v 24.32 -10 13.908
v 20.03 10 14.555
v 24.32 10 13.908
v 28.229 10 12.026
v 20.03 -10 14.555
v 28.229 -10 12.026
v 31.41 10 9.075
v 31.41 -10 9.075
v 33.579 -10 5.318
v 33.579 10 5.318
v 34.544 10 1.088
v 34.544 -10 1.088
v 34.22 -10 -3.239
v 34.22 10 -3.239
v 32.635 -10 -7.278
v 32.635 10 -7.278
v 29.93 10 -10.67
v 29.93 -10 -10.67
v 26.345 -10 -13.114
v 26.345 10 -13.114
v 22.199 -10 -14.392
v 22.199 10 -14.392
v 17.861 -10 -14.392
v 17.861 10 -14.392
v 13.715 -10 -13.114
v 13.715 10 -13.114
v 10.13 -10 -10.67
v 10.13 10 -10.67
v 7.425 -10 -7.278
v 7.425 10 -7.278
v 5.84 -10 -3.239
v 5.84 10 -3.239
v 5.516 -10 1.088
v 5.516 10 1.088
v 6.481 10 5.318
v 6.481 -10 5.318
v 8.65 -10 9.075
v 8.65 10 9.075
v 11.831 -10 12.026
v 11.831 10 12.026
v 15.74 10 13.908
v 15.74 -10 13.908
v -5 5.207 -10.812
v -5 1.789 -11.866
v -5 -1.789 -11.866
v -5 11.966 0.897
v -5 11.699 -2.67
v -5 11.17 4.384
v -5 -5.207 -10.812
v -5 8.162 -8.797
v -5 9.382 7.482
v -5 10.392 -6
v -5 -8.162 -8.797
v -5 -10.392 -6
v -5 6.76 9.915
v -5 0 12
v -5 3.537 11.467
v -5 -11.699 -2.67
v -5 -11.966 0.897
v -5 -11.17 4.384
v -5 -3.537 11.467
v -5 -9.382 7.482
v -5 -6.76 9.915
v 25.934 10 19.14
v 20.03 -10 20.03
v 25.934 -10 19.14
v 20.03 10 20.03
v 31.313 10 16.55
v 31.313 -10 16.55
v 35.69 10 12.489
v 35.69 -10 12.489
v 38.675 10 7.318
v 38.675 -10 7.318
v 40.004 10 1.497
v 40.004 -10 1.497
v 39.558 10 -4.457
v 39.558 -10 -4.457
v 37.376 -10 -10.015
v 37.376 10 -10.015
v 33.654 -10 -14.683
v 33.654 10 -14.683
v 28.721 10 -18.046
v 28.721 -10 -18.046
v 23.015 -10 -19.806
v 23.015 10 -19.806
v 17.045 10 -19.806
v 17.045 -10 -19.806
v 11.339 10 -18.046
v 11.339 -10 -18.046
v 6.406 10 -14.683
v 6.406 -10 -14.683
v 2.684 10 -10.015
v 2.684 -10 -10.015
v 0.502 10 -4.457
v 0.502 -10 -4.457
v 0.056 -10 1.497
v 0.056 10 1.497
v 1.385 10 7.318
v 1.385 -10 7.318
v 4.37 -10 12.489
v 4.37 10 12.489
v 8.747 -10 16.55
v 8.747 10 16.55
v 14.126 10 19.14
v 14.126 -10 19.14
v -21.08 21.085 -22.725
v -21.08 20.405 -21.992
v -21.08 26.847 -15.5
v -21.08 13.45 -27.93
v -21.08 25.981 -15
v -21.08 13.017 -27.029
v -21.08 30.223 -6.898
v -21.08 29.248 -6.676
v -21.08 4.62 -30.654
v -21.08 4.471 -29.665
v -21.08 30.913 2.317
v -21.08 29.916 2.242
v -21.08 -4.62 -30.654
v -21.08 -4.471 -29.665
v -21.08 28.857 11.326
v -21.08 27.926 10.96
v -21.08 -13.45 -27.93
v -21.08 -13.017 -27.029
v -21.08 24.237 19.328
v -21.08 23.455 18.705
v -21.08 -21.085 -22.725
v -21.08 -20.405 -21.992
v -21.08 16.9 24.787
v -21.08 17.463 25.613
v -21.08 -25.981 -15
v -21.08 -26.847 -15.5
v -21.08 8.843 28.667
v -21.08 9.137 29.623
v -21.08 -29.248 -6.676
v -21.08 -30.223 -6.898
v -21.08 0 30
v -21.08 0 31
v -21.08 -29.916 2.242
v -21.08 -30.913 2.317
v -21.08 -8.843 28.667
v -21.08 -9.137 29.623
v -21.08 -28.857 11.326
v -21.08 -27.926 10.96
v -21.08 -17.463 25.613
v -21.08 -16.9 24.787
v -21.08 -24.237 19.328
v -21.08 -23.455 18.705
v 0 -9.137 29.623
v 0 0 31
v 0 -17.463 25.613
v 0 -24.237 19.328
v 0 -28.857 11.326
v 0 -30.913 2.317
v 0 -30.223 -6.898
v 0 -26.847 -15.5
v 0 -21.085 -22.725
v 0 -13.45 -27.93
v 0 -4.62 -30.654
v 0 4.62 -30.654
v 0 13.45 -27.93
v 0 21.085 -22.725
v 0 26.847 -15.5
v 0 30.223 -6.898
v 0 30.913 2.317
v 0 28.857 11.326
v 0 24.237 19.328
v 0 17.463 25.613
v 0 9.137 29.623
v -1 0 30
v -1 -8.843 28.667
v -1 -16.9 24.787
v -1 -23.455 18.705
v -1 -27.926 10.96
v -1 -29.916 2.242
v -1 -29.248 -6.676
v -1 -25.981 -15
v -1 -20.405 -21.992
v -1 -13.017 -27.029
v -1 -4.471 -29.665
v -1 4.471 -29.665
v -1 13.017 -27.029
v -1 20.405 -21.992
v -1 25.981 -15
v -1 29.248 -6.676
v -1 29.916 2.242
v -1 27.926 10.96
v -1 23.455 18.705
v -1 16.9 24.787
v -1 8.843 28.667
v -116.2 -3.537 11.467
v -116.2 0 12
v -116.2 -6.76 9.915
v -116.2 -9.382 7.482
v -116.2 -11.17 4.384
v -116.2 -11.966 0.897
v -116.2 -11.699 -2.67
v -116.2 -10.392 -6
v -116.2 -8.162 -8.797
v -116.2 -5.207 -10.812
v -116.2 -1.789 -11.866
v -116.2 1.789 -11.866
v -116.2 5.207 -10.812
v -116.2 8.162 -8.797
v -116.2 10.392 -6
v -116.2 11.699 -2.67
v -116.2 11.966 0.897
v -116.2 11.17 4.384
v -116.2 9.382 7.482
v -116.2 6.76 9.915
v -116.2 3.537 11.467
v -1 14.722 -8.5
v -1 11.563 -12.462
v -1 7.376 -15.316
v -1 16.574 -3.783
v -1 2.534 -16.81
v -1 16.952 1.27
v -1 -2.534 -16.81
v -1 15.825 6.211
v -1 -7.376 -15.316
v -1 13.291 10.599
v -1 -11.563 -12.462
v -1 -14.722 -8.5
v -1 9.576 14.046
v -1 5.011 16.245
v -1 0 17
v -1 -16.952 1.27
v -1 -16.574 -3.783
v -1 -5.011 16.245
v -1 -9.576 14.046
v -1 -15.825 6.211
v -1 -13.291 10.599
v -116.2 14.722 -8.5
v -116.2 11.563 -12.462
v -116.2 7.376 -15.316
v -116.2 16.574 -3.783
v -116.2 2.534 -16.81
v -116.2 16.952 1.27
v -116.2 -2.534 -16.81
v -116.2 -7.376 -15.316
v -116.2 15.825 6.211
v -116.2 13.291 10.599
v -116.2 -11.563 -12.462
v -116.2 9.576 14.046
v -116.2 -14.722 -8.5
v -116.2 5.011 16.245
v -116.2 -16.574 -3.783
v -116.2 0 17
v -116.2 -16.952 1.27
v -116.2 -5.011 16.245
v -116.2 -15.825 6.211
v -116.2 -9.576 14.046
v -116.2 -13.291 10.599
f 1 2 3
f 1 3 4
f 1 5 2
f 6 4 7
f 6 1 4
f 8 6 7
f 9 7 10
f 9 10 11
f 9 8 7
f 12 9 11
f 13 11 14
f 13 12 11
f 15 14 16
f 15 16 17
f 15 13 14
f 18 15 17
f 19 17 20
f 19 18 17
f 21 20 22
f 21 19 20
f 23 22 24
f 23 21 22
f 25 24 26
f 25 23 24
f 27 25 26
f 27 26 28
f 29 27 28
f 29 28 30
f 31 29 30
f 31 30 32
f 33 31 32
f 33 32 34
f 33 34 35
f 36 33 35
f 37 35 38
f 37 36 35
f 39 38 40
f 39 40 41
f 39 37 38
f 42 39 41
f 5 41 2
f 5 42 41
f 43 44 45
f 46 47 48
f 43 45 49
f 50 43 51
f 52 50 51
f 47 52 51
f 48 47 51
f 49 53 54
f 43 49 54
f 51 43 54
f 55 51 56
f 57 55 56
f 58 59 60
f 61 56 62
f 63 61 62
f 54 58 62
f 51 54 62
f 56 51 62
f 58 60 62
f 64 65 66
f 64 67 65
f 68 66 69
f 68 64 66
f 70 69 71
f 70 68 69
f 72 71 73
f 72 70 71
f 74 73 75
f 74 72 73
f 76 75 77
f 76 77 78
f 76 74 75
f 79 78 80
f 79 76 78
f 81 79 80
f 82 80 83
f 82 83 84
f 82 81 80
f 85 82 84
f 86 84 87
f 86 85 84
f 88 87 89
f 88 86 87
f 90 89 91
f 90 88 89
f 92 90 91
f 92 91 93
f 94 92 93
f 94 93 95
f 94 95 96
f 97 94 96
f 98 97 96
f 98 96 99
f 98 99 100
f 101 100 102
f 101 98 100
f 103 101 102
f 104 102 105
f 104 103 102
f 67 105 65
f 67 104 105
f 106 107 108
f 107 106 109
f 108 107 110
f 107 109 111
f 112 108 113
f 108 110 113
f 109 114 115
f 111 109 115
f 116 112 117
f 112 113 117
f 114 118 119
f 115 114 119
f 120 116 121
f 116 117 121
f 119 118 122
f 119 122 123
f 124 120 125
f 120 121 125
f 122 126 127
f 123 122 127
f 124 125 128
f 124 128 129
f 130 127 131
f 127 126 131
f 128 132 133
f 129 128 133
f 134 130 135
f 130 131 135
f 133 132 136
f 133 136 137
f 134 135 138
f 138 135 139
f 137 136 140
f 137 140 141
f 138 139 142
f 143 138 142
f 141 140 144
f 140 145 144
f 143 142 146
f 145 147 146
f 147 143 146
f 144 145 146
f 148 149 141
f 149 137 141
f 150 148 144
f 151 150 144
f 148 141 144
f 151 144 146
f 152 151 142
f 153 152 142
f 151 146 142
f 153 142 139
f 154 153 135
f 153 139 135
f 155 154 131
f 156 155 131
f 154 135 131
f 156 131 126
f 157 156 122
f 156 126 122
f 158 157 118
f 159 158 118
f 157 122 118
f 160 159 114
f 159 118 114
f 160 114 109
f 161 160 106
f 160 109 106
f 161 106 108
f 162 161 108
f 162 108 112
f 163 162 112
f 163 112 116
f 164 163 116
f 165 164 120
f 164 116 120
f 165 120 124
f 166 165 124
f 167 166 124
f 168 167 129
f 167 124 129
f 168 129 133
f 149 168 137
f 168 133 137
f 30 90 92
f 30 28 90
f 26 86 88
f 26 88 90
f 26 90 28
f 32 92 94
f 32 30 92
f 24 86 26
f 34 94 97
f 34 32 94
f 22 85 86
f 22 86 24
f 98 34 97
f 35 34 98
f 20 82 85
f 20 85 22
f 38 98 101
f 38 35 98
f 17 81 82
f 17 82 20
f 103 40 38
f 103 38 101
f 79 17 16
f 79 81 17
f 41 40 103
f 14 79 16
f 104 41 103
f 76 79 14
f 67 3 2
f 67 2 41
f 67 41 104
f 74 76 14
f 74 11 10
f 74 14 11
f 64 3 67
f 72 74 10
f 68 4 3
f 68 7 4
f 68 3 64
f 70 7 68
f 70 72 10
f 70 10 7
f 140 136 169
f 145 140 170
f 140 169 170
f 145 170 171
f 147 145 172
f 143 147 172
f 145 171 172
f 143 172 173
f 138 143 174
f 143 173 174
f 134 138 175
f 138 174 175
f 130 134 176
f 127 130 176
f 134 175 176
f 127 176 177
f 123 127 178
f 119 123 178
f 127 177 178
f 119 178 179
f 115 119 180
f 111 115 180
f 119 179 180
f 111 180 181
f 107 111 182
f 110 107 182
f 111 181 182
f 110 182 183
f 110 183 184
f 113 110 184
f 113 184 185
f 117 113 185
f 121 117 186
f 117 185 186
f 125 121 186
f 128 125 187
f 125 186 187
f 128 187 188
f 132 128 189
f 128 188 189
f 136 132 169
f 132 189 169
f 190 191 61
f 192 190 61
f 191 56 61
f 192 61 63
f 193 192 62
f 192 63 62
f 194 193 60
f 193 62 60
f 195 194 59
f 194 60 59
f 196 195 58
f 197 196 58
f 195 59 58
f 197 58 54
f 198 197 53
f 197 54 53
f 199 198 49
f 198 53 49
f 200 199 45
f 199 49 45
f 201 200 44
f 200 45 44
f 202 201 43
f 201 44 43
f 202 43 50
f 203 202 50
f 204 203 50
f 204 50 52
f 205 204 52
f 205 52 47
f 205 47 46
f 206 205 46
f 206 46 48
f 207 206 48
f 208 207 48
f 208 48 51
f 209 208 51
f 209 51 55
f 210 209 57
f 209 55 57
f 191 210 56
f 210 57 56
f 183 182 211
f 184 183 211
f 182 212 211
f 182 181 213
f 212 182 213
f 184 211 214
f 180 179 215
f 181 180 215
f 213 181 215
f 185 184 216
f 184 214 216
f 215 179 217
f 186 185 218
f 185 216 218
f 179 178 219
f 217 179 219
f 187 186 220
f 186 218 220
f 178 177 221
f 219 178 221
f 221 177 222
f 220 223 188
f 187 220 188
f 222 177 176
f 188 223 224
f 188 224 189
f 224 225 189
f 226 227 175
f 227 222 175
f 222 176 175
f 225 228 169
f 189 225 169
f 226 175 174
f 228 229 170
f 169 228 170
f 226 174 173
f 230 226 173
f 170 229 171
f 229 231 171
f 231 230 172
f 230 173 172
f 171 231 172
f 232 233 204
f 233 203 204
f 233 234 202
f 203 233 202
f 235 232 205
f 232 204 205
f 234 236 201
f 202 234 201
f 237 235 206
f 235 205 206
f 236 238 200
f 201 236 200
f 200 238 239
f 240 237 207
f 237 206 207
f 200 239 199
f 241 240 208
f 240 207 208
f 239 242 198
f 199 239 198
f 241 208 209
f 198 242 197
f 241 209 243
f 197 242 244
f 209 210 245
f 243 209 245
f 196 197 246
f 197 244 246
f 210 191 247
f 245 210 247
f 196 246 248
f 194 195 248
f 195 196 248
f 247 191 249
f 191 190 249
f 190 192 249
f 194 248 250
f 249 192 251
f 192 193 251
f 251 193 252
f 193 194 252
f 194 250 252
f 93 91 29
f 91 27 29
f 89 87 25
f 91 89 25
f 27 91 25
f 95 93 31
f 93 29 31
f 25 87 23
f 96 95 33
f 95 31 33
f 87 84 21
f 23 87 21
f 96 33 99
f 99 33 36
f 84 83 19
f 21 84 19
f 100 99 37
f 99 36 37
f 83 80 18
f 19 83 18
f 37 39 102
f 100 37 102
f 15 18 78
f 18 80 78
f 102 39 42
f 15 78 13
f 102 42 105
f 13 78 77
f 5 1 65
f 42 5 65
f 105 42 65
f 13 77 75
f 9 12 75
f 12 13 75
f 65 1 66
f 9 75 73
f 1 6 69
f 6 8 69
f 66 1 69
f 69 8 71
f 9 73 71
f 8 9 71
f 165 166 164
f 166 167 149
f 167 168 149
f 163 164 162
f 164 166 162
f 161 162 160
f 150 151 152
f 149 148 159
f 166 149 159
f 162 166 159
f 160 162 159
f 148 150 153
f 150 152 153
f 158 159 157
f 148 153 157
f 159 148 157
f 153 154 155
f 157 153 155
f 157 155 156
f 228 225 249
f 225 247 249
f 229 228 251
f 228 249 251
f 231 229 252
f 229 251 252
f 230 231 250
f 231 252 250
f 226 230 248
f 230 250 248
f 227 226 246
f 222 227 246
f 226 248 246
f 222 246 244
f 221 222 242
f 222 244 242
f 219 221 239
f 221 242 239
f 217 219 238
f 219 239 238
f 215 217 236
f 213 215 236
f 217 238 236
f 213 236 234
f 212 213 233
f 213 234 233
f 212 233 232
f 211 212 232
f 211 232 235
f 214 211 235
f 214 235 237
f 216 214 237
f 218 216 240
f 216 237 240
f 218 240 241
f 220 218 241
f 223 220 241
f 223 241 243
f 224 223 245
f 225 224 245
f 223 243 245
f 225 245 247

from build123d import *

# Parameters (mm, degrees)
SKETCH2_R           = 20.03
SKETCH2_R_2         = 14.555
BOSS_EXTRUDE1_DEPTH = 10


with BuildPart() as part:
    # Sketch1 → Revolve1 (revolve)
    with BuildSketch(Plane.XY, mode=Mode.PRIVATE) as revolve1_sk:
        Polygon((-116.2, 12), (-5, 12), (-5, 0), (0, 0), (0, 15), (0, 31), (-21.080384326, 31), (-21.080384326, 30), (-1, 30), (-1, 17), (-116.2, 17), align=None)
    revolve(revolve1_sk.sketch.rotate(Axis((-5, 0, 0), (1, 0, 0)), 90), axis=Axis((-5, 0, 0), (1, 0, 0)))


with BuildPart() as body_2:
    # Sketch2 → Boss-Extrude1 (new, symmetric)
    with BuildSketch(Plane(origin=(0, 0, 0), x_dir=(1, 0, 0), z_dir=(0, 1, 0))):
        with Locations(Location((20.03, 0, 0), (0, 0, 270))):
            Circle(SKETCH2_R)
        with Locations(Location((20.03, 0, 0), (0, 0, 270))):
            Circle(SKETCH2_R_2, mode=Mode.SUBTRACT)
    extrude(amount=BOSS_EXTRUDE1_DEPTH, both=True)


solid = Compound([part.part, body_2.part])
